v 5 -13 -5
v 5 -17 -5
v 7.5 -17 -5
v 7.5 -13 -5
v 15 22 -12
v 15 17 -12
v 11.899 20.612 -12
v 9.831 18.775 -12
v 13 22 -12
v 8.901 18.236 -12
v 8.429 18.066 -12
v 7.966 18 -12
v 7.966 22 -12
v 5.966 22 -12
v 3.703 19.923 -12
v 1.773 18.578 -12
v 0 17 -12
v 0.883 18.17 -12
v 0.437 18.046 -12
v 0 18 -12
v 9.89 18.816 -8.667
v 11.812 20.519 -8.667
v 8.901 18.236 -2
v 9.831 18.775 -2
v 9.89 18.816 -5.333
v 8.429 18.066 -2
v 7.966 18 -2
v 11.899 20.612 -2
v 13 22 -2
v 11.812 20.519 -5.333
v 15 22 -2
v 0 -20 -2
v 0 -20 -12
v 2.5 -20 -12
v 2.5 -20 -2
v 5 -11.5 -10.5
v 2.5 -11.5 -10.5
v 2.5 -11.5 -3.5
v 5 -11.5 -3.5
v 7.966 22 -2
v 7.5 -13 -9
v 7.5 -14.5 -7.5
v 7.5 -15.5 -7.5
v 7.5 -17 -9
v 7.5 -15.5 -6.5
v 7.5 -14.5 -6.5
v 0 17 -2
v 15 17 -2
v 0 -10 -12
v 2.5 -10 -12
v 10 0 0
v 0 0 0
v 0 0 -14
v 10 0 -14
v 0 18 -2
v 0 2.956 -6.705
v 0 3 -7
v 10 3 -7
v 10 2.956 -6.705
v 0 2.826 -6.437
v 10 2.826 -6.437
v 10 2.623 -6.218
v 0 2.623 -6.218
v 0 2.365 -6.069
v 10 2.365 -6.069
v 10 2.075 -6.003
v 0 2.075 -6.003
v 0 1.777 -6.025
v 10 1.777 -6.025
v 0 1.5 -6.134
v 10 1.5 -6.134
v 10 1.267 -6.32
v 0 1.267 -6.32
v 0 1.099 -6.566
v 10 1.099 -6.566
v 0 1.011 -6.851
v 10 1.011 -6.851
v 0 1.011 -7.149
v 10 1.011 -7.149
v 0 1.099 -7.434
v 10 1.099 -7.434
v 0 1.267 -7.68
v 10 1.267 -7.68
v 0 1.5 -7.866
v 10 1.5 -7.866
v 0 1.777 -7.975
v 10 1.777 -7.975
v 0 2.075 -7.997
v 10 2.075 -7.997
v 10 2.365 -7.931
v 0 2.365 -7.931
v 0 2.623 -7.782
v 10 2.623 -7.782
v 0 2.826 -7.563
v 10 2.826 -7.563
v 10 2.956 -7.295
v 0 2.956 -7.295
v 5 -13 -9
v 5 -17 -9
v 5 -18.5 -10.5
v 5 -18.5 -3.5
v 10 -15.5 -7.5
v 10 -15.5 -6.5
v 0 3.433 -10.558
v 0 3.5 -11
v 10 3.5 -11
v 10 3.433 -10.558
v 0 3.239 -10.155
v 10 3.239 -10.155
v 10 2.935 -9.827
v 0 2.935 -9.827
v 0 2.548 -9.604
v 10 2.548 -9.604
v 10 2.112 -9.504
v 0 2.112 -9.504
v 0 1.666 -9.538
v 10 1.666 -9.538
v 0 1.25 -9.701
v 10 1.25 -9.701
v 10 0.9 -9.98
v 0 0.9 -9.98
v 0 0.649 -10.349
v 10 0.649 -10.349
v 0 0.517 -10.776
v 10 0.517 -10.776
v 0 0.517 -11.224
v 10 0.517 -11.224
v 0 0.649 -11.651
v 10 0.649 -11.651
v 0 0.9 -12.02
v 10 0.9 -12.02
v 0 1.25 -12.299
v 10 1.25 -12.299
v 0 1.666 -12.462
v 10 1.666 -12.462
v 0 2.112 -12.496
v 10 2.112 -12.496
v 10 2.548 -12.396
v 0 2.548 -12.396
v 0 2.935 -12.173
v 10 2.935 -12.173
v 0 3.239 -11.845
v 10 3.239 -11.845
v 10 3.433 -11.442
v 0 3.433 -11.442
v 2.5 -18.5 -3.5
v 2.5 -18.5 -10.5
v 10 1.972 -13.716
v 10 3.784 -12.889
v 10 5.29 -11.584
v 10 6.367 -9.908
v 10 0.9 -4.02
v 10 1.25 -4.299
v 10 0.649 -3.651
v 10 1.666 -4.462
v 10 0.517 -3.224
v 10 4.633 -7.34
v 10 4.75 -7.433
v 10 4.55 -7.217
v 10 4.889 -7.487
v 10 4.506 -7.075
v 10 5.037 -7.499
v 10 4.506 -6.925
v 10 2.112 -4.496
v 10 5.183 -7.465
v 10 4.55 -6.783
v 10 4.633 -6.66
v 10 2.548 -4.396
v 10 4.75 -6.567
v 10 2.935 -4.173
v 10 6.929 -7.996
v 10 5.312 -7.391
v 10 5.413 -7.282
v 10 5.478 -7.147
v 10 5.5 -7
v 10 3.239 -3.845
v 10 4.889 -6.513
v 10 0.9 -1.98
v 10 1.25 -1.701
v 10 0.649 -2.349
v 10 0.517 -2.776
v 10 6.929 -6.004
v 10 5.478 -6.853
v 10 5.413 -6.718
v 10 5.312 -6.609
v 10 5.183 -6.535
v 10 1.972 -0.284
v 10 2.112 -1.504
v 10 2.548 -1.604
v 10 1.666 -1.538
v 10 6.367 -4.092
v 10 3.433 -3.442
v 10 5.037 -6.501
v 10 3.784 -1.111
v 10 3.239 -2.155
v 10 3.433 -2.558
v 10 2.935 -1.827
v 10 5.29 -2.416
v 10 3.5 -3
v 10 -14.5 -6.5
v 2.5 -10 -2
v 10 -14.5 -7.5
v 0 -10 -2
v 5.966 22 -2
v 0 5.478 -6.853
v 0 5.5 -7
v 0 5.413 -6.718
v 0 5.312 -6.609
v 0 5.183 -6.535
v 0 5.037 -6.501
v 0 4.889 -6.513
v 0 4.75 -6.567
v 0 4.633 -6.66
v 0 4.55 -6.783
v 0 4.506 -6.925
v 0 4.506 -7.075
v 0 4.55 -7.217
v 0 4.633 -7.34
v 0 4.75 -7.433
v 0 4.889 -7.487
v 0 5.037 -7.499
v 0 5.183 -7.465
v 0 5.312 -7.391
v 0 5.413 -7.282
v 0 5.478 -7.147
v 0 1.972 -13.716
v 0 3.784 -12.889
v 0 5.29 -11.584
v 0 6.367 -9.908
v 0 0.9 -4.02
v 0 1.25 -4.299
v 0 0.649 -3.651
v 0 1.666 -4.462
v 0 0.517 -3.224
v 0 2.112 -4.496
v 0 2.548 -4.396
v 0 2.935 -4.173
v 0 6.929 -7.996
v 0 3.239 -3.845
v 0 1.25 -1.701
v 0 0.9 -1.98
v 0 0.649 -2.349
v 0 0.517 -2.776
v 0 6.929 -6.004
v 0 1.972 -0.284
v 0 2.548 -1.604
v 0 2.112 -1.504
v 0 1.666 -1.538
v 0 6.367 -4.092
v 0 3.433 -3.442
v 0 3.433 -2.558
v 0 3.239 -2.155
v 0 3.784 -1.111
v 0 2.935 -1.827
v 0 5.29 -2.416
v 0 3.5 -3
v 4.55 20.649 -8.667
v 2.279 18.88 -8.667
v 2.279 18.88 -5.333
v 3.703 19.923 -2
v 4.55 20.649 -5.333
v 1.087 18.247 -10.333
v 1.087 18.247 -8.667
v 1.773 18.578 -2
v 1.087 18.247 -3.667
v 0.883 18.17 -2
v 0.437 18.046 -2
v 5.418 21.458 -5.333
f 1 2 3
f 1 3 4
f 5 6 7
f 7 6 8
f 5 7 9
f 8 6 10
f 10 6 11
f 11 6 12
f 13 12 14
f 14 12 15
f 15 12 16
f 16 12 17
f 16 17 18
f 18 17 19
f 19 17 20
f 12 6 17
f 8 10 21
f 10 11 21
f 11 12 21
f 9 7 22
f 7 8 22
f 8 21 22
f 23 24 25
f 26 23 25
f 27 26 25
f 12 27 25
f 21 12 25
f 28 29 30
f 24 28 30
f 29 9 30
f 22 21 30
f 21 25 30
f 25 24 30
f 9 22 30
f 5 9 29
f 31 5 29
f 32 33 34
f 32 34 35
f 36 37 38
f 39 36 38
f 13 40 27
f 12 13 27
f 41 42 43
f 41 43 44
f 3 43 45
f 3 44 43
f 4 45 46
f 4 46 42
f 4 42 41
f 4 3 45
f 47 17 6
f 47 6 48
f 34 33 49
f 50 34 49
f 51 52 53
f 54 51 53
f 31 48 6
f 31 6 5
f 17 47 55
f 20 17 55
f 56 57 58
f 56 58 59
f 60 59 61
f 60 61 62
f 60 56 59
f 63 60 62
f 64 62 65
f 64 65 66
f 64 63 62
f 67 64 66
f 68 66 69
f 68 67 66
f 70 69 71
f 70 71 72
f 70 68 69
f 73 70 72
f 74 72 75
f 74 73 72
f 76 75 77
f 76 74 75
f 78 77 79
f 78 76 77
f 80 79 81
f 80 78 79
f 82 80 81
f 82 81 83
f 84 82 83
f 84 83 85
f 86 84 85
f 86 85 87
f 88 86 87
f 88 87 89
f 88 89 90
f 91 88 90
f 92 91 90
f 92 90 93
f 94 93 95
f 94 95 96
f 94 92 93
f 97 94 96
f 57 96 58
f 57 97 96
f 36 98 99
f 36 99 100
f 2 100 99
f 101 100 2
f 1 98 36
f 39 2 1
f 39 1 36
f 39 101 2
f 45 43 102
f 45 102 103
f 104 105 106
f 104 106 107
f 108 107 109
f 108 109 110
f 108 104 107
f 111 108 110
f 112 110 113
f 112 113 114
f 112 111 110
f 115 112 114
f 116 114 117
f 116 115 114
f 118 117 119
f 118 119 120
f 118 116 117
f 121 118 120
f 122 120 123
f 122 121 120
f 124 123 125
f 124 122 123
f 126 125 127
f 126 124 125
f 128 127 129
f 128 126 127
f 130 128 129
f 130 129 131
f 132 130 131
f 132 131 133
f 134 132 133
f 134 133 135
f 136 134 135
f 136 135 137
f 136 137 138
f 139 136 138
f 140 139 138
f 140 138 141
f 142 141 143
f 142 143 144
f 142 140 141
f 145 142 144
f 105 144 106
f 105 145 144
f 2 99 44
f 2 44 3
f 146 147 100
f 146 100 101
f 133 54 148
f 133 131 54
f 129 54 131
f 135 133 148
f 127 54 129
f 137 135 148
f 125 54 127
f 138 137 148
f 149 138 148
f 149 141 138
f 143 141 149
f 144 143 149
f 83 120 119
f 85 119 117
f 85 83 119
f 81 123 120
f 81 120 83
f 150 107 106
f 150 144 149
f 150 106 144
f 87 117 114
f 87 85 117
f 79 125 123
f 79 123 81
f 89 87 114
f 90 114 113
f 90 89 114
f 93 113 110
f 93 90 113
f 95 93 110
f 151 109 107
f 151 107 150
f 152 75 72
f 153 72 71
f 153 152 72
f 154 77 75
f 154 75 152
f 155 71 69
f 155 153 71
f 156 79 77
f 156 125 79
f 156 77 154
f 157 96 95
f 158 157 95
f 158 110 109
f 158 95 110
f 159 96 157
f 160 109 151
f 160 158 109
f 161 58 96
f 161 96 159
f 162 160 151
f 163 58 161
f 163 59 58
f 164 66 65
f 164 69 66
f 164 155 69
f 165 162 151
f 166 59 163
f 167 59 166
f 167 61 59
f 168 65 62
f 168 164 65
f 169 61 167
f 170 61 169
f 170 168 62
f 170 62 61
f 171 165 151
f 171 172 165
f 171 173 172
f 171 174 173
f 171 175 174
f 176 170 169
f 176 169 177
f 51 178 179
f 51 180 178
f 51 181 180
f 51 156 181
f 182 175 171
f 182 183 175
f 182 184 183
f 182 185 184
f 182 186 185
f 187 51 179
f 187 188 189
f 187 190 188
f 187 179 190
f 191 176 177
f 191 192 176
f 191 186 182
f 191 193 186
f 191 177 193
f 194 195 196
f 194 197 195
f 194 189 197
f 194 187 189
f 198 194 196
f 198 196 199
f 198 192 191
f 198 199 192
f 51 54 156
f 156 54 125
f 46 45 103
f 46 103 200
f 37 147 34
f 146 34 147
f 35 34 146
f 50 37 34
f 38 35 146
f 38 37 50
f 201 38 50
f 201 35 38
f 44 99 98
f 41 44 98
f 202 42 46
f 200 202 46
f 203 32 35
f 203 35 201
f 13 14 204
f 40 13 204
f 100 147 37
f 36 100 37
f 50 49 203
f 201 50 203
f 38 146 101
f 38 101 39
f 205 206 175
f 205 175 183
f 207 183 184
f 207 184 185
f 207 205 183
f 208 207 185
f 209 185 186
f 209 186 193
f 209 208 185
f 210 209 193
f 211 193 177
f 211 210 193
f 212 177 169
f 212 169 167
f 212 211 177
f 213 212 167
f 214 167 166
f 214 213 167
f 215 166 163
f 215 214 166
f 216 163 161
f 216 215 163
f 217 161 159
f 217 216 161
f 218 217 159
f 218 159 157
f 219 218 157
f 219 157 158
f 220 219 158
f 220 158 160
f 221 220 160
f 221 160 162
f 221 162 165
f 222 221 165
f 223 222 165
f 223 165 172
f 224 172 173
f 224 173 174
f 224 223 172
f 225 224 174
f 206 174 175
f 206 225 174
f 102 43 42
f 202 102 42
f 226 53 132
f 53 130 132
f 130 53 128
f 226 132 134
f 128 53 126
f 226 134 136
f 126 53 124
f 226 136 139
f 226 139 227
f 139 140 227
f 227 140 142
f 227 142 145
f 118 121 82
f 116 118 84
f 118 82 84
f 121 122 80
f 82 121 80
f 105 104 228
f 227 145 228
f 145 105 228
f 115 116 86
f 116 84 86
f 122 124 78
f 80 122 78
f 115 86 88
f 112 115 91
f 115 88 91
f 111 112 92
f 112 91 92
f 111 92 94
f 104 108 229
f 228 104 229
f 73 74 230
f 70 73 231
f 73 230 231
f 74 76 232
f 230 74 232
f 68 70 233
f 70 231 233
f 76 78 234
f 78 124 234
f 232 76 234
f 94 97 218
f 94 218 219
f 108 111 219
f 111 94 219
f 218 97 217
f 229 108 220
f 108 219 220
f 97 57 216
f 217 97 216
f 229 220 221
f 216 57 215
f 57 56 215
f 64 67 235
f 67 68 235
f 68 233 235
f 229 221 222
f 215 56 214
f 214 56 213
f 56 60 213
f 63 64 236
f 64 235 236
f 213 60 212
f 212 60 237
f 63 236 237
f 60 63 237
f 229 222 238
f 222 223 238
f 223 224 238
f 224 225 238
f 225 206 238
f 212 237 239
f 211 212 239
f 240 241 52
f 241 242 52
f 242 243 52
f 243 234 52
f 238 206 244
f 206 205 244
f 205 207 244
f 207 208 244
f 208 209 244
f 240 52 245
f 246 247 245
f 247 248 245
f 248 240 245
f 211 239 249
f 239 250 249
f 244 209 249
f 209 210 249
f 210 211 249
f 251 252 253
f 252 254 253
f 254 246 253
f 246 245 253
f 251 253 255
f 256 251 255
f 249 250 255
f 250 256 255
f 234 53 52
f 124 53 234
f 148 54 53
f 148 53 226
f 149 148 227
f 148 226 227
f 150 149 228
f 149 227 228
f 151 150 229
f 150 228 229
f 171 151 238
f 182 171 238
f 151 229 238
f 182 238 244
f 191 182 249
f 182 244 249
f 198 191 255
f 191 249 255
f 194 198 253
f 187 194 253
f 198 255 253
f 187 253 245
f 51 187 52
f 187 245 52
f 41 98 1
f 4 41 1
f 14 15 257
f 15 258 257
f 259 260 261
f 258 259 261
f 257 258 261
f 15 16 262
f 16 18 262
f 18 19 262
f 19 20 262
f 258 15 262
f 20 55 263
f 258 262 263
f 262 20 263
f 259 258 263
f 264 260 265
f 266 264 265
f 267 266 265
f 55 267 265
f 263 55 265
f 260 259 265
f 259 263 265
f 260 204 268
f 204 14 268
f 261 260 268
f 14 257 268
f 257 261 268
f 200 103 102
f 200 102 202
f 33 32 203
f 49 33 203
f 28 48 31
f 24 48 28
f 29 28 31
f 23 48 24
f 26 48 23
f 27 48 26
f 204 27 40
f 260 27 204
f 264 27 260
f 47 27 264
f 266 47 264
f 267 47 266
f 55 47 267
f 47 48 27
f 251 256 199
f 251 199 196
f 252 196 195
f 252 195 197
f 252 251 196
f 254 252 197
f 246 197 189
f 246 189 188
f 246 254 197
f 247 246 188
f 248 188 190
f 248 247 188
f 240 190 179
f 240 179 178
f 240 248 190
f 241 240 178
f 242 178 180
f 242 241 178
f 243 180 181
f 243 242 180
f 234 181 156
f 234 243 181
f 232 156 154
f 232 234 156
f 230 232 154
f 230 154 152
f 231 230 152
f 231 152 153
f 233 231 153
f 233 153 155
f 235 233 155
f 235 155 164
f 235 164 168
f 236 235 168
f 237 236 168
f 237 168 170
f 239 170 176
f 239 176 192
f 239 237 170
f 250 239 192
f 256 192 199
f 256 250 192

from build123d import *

# Parameters (mm, degrees)
F0_W     = 10
F0_H     = 10
F0_W_2   = 7
F0_H_2   = 7
F0_W_3   = 4
F0_H_3   = 4
F0_W_4   = 1
F0_H_4   = 1
F1_DEPTH = 2.5
F2_DEPTH = 5
F3_DEPTH = 7.5
F4_DEPTH = 10
F0_R     = 1.5
F0_R_2   = 1
F0_R_3   = 0.5
F5_DEPTH = 10
F0_W_5   = 5
F6_DEPTH = 15
F8_DEPTH = 25


with BuildPart() as f1:
    # F0 (on Right) → F1 (new body)
    with BuildSketch(Plane.YZ):
        with Locations((-15, -7)):
            Rectangle(F0_W, F0_H)
        with Locations((-15, -7)):
            Rectangle(F0_W_2, F0_H_2, mode=Mode.SUBTRACT)
        with Locations((-15, -7)):
            Rectangle(F0_W_2, F0_H_2)
        with Locations((-15, -7)):
            Rectangle(F0_W_3, F0_H_3, mode=Mode.SUBTRACT)
        with Locations((-15, -7)):
            Rectangle(F0_W_3, F0_H_3)
        with Locations((-15, -7)):
            Rectangle(F0_W_4, F0_H_4, mode=Mode.SUBTRACT)
        with Locations((-15, -7)):
            Rectangle(F0_W_4, F0_H_4)
    extrude(amount=F1_DEPTH)

    # F0 (on Right) → F2 (join)
    with BuildSketch(Plane.YZ):
        with Locations((-15, -7)):
            Rectangle(F0_W_2, F0_H_2)
        with Locations((-15, -7)):
            Rectangle(F0_W_3, F0_H_3, mode=Mode.SUBTRACT)
        with Locations((-15, -7)):
            Rectangle(F0_W_3, F0_H_3)
        with Locations((-15, -7)):
            Rectangle(F0_W_4, F0_H_4, mode=Mode.SUBTRACT)
        with Locations((-15, -7)):
            Rectangle(F0_W_4, F0_H_4)
    extrude(amount=F2_DEPTH)

    # F0 (on Right) → F3 (join)
    with BuildSketch(Plane.YZ):
        with Locations((-15, -7)):
            Rectangle(F0_W_3, F0_H_3)
        with Locations((-15, -7)):
            Rectangle(F0_W_4, F0_H_4, mode=Mode.SUBTRACT)
        with Locations((-15, -7)):
            Rectangle(F0_W_4, F0_H_4)
    extrude(amount=F3_DEPTH)

    # F0 (on Right) → F4 (join)
    with BuildSketch(Plane.YZ):
        with Locations((-15, -7)):
            Rectangle(F0_W_4, F0_H_4)
    extrude(amount=F4_DEPTH)


with BuildPart() as f5:
    # F0 (on Right) → F5 (new body)
    with BuildSketch(Plane.YZ):
        with BuildLine():
            ThreePointArc((0, -14), (7, -7), (0, 0))
            Line((0, 0), (0, -14))
        make_face()
        with Locations((2, -11)):
            Circle(F0_R, mode=Mode.SUBTRACT)
        with Locations((2, -7)):
            Circle(F0_R_2, mode=Mode.SUBTRACT)
        with Locations((5, -7)):
            Circle(F0_R_3, mode=Mode.SUBTRACT)
        with Locations((2, -3)):
            Circle(F0_R, mode=Mode.SUBTRACT)
    extrude(amount=F5_DEPTH)


with BuildPart() as f6:
    # F0 (on Right) → F6 (new body)
    with BuildSketch(Plane.YZ):
        with Locations((19.5, -7)):
            Rectangle(F0_W_5, F0_H)
    extrude(amount=F6_DEPTH)

    # F7 (on Top) → F8 (cut)
    with BuildSketch(Plane.XY):
        with BuildLine():
            Line((13, 22), (7.9664092259, 22))
            Line((7.9664092259, 22), (7.9664092259, 18))
            add(Edge.make_bspline(
                [(7.9664092259, 18), (9.6468937332, 18.0028863251), (12.4226497308, 21), (13, 22)],
                knots=[0, 0, 0, 0, 6.4293884686, 6.4293884686, 6.4293884686, 6.4293884686], degree=3))
        make_face()
        with BuildLine():
            Line((0, 22), (0, 18))
            add(Edge.make_bspline(
                [(0, 18), (2, 18), (5.2593024448, 21.2928932188), (5.9664092259, 22)],
                knots=[0, 0, 0, 0, 7.1831775038, 7.1831775038, 7.1831775038, 7.1831775038], degree=3))
            Line((5.9664092259, 22), (0, 22))
        make_face()
    extrude(amount=-F8_DEPTH, mode=Mode.SUBTRACT)


solid = Compound([f1.part, f5.part, f6.part])
